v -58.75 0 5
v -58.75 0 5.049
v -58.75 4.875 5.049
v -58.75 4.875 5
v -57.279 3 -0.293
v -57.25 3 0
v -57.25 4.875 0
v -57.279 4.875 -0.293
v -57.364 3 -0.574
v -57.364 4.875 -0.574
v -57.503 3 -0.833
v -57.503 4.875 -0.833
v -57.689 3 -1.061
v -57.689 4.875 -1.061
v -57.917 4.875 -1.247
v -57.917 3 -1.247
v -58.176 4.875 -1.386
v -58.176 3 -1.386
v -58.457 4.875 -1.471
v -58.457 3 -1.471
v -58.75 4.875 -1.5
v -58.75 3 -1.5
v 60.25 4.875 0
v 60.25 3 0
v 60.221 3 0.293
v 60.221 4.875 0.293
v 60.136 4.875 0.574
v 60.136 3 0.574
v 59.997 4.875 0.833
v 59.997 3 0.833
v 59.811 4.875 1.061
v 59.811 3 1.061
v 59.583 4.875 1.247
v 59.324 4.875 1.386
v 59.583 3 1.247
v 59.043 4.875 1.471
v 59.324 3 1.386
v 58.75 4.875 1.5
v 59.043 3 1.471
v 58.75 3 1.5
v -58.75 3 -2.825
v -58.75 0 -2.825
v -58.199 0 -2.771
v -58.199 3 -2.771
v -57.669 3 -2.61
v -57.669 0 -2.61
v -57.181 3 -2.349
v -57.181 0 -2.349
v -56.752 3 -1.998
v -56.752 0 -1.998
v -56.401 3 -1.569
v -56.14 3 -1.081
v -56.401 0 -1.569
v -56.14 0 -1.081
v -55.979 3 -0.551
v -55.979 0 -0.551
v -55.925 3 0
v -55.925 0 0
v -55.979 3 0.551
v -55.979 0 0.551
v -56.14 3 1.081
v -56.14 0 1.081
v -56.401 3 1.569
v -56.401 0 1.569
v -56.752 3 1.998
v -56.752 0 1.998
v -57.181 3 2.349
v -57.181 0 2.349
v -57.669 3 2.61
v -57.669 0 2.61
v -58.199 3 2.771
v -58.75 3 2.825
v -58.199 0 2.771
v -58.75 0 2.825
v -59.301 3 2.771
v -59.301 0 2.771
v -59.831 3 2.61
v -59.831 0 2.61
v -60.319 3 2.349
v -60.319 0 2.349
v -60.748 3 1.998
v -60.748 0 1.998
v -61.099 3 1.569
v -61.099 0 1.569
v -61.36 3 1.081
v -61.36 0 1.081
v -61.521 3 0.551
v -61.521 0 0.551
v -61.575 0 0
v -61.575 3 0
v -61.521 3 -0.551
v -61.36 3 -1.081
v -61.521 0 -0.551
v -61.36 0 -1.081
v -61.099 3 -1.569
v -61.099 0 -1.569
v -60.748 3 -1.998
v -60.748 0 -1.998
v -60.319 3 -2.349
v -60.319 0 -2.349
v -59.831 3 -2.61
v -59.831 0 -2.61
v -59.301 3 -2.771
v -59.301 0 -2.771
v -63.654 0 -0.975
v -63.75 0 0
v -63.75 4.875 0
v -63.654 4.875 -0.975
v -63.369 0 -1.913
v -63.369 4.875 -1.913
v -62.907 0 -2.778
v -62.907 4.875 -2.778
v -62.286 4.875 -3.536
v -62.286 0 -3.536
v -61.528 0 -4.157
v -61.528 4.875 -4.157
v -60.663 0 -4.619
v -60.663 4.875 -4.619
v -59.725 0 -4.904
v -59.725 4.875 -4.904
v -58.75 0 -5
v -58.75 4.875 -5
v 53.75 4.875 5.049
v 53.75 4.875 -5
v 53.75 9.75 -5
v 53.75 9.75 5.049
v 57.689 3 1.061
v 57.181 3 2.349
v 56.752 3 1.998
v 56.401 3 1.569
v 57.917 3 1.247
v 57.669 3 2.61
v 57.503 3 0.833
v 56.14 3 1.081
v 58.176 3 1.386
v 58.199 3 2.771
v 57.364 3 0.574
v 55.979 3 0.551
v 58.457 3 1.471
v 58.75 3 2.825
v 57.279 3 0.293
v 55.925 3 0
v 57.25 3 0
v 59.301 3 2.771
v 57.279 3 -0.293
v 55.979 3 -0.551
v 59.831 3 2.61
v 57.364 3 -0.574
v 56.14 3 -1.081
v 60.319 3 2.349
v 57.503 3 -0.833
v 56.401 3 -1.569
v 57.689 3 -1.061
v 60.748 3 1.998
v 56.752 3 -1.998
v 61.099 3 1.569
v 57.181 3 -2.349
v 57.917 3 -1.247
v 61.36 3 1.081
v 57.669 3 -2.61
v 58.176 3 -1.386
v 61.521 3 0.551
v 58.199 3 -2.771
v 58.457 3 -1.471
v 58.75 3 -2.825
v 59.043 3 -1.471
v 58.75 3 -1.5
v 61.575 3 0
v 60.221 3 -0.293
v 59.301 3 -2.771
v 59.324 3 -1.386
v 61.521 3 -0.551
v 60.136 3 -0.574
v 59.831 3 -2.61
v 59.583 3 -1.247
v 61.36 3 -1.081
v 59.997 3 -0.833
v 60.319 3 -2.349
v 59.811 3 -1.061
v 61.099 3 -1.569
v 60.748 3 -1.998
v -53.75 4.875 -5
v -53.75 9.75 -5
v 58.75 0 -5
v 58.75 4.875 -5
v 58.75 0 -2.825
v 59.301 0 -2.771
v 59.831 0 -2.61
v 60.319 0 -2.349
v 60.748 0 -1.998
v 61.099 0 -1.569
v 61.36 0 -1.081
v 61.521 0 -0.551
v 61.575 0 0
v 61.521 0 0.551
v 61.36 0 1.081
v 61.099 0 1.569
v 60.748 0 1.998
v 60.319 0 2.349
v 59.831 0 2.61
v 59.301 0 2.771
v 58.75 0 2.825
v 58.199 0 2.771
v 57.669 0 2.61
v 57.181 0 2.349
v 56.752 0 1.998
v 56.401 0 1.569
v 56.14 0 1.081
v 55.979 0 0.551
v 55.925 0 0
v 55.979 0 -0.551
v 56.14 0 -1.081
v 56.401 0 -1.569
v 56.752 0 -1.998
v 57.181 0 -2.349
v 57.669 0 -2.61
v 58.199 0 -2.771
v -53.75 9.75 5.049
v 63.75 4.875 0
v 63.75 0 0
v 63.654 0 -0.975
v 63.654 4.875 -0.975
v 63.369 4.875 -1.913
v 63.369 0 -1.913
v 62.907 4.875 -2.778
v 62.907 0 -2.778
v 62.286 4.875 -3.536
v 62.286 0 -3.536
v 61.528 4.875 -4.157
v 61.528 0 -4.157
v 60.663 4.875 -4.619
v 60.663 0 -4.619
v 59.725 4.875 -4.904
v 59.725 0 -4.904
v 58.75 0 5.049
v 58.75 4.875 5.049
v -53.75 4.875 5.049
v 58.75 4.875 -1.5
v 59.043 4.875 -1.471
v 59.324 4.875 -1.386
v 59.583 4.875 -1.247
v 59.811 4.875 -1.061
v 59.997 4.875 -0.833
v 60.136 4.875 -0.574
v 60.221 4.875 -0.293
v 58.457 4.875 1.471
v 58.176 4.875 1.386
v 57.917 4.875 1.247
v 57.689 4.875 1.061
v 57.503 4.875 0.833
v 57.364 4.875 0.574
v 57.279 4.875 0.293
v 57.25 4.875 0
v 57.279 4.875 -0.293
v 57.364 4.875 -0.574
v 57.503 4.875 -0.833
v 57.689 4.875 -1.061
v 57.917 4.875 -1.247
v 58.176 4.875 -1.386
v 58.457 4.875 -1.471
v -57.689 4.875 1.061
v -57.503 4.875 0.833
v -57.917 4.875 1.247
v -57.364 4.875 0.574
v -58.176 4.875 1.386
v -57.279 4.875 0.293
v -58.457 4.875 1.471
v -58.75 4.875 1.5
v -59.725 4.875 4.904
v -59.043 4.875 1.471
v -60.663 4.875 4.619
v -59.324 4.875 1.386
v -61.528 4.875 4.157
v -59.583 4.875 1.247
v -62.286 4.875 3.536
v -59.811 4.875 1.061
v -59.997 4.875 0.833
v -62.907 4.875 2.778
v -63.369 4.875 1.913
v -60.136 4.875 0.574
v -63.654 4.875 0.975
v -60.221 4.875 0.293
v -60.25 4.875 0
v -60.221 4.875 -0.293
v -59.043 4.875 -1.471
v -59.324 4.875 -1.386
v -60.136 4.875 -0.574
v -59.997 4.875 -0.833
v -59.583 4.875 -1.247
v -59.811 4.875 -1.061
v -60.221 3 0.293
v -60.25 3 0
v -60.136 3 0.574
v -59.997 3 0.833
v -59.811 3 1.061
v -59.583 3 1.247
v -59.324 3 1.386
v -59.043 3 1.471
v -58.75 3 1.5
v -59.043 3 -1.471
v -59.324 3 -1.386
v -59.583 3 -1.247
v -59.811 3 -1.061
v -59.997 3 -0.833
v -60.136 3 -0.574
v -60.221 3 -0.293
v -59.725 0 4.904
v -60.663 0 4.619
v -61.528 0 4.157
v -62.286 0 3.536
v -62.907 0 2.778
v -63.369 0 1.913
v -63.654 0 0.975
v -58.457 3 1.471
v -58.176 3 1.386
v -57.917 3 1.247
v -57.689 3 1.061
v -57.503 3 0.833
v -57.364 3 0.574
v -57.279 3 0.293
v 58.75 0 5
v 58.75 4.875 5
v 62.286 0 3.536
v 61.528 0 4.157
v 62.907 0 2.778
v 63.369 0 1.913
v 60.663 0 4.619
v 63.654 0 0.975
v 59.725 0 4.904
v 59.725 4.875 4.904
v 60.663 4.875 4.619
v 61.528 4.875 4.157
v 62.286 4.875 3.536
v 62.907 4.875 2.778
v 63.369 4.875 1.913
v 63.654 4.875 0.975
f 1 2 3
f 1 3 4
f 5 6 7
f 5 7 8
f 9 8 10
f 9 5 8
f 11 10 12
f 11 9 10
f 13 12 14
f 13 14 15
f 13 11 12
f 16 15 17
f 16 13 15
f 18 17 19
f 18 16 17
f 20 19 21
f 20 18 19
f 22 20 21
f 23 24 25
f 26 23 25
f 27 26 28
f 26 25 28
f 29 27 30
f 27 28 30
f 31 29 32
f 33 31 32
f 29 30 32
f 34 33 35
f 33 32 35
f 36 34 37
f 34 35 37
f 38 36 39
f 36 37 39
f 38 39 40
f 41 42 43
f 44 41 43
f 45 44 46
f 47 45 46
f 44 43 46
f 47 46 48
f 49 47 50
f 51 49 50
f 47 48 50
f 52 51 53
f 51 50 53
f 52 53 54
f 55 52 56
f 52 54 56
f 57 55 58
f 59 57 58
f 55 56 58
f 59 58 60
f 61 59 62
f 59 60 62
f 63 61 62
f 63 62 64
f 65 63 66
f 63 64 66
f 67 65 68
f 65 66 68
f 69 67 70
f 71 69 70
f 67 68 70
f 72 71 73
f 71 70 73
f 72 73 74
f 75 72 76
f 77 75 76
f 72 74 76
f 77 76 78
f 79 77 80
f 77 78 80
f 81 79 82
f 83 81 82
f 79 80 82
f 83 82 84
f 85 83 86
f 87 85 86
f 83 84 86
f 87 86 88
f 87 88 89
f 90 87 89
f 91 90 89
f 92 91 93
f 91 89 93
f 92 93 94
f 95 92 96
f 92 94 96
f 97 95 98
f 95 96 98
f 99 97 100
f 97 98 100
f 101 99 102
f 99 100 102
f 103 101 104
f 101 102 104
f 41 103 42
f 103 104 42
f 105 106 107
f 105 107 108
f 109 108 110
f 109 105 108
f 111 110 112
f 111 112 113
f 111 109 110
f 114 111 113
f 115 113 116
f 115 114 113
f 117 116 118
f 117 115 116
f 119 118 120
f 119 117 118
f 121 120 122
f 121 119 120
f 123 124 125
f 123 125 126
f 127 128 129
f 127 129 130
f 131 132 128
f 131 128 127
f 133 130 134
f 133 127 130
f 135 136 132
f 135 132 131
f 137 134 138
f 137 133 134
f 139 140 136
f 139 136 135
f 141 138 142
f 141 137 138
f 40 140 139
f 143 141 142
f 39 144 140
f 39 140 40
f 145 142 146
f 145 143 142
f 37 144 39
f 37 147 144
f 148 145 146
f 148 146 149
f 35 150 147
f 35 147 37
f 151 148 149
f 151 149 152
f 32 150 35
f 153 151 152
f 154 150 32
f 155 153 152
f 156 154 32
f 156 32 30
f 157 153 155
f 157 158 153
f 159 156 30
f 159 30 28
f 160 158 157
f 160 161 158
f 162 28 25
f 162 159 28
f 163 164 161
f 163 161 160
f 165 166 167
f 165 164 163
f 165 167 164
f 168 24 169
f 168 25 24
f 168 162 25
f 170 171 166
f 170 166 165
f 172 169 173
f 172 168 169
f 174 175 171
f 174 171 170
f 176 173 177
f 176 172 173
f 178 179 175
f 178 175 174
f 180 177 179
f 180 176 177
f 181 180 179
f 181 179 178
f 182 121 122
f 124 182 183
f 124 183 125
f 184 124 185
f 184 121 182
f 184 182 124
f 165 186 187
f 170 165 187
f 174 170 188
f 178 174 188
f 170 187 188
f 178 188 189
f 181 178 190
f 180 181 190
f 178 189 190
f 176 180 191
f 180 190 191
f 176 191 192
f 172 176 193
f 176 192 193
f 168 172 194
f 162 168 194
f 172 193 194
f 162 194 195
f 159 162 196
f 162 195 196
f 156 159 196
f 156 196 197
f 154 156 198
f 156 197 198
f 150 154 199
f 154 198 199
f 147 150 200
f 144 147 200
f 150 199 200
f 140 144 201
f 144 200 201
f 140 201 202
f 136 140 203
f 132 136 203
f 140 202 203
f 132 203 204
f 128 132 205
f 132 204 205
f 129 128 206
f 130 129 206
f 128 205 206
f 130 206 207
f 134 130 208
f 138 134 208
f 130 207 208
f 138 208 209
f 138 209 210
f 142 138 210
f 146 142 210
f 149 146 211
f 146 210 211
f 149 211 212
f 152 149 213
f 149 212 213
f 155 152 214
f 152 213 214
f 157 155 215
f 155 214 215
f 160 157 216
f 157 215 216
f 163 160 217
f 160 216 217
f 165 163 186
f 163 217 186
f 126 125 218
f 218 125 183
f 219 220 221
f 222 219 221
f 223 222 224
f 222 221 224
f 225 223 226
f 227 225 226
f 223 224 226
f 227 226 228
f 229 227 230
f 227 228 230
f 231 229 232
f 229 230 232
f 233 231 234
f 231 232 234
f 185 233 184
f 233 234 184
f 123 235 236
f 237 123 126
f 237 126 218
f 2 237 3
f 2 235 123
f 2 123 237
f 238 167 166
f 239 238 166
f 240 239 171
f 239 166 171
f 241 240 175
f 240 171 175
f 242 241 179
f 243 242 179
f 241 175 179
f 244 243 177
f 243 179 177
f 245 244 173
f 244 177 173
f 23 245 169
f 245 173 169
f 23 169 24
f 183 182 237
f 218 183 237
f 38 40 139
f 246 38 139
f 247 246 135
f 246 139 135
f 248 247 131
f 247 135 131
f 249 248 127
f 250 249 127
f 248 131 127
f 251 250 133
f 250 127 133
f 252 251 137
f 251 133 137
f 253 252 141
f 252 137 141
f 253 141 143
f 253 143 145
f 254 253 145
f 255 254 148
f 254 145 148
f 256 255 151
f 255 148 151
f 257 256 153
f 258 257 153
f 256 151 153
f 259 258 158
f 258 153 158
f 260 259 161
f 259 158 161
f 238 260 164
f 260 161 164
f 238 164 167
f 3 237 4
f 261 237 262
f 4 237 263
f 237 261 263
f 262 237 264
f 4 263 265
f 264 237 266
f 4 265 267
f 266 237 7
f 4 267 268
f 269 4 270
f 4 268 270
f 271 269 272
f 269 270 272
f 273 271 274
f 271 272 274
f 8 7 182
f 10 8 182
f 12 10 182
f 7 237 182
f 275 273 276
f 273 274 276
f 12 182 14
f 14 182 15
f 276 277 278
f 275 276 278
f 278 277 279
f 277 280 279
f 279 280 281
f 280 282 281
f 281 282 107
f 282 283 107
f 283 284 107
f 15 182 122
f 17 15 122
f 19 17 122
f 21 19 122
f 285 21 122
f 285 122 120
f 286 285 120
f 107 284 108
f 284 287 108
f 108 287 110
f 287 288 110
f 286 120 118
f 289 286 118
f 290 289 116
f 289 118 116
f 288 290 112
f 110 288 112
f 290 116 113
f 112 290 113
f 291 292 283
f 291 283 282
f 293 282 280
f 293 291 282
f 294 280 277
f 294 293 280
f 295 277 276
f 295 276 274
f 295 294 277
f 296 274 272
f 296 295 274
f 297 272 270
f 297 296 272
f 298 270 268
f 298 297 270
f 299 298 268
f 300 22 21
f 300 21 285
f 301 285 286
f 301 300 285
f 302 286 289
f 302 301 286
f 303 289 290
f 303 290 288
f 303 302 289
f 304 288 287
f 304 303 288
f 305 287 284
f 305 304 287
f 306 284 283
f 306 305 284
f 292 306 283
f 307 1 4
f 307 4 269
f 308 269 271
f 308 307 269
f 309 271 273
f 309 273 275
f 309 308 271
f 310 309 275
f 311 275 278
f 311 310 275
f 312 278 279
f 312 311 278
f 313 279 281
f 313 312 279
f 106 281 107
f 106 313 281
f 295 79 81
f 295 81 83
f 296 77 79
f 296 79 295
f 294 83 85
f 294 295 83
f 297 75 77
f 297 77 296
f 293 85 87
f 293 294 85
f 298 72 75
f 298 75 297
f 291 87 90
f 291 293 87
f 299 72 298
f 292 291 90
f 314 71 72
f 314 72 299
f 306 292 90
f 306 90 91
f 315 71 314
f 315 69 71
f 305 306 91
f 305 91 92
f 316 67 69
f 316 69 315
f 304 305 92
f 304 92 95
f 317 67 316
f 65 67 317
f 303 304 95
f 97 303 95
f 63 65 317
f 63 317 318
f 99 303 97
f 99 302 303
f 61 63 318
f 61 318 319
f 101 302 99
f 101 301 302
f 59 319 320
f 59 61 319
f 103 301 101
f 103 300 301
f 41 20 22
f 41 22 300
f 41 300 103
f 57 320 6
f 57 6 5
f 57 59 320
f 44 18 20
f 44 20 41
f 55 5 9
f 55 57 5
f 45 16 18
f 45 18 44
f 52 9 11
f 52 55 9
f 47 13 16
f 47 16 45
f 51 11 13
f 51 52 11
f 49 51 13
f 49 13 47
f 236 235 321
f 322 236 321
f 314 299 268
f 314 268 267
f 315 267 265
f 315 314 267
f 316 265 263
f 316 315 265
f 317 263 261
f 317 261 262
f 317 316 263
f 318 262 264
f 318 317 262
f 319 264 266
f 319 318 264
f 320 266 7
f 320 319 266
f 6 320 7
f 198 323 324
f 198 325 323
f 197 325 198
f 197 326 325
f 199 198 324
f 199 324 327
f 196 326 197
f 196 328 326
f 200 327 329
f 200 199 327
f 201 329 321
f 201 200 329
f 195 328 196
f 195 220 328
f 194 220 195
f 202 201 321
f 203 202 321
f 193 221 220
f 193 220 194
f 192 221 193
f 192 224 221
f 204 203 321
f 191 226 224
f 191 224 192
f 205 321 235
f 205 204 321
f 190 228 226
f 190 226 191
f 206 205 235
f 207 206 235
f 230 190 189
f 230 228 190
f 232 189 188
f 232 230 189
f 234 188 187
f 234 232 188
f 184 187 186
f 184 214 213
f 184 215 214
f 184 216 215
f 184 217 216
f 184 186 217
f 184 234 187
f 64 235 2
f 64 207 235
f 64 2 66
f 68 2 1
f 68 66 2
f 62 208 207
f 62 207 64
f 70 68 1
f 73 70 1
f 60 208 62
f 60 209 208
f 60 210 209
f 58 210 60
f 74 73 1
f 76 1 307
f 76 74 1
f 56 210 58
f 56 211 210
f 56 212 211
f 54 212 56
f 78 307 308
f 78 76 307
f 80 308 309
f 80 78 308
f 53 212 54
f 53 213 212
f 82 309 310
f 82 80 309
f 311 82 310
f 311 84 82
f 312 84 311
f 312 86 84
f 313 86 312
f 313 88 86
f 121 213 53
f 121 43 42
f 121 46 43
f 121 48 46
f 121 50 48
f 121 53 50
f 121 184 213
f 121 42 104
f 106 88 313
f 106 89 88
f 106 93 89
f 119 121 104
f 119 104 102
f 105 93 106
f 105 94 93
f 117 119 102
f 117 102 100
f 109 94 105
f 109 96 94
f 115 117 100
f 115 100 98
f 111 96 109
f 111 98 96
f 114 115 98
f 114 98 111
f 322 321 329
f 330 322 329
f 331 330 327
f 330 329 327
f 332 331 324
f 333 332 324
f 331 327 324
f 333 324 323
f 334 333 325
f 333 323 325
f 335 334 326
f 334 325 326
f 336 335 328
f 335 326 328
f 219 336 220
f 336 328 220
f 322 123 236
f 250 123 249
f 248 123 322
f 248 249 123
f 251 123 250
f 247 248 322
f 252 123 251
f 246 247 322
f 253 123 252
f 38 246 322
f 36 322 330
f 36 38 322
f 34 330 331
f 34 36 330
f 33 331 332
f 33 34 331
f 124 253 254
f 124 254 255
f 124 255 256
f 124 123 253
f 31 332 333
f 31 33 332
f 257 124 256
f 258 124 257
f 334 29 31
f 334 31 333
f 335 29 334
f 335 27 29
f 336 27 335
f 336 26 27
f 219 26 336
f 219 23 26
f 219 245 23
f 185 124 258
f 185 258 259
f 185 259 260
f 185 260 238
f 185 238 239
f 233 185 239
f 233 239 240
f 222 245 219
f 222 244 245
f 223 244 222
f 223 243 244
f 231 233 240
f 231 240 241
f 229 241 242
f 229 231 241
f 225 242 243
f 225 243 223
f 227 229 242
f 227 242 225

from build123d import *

# Parameters (mm, degrees)
BOSS_EXTRUDE1_DEPTH = 9.75
CUT_EXTRUDE3_START  = -4.875
CUT_EXTRUDE3_DEPTH  = 4.875
SKETCH3_R           = 2.825
CUT_EXTRUDE4_DEPTH  = 3


with BuildPart() as part:
    # Sketch1 → Boss-Extrude1 (new body)
    with BuildSketch(Plane(origin=(0, 0, 0), x_dir=(1, 0, 0), z_dir=(0, 1, 0))):
        with BuildLine():
            Line((0, 5), (0, 0))
            Line((0, 0), (53.75, 0))
            ThreePointArc((53.75, 0), (55.214466094, 3.535533906), (58.75, 5))
            Line((58.75, 5), (0, 5))
        make_face()
        with BuildLine():
            Line((53.75, 0), (0, 0))
            Line((0, 0), (0, -5.049027621))
            Line((0, -5.049027621), (58.75, -5.049027621))
            Line((58.75, -5.049027621), (58.75, -5))
            ThreePointArc((58.75, -5), (55.214466094, -3.535533906), (53.75, 0))
        make_face()
        with BuildLine():
            ThreePointArc((63.75, 0), (62.285533906, 3.535533906), (58.75, 5))
            Line((58.75, 5), (58.75, 1.5))
            ThreePointArc((58.75, 1.5), (59.810660172, 1.060660172), (60.25, 0))
            ThreePointArc((60.25, 0), (59.810660172, -1.060660172), (58.75, -1.5))
            Line((58.75, -1.5), (58.75, -5))
            ThreePointArc((58.75, -5), (62.285533906, -3.535533906), (63.75, 0))
        make_face()
        with BuildLine():
            ThreePointArc((58.75, 5), (55.214466094, 3.535533906), (53.75, 0))
            Line((53.75, 0), (57.25, 0))
            ThreePointArc((57.25, 0), (57.689339828, 1.060660172), (58.75, 1.5))
            Line((58.75, 1.5), (58.75, 5))
        make_face()
        with BuildLine():
            Line((57.25, 0), (53.75, 0))
            ThreePointArc((53.75, 0), (55.214466094, -3.535533906), (58.75, -5))
            Line((58.75, -5), (58.75, -1.5))
            ThreePointArc((58.75, -1.5), (57.689339828, -1.060660172), (57.25, 0))
        make_face()
    boss_extrude1 = extrude(amount=BOSS_EXTRUDE1_DEPTH)

    # Mirror1: Boss-Extrude1 across plane
    add(boss_extrude1.mirror(Plane(origin=(0, 0, 0), x_dir=(0, 0, 1), z_dir=(1, 0, 0))))

    # Sketch2 → Cut-Extrude3 (cut)
    with BuildSketch(Plane(origin=(0, 9.75, 0), x_dir=(1, 0, 0), z_dir=(0, 1, 0)).offset(CUT_EXTRUDE3_START)):
        with BuildLine():
            Line((60.25, 0), (63.75, 0))
            ThreePointArc((63.75, 0), (62.285533906, 3.535533906), (58.75, 5))
            Line((58.75, 5), (53.75, 5))
            Line((53.75, 5), (53.75, 0))
            Line((53.75, 0), (57.25, 0))
            ThreePointArc((57.25, 0), (58.75, 1.5), (60.25, 0))
        make_face()
        with BuildLine():
            ThreePointArc((58.75, -5), (62.285533906, -3.535533906), (63.75, 0))
            Line((63.75, 0), (60.25, 0))
            ThreePointArc((60.25, 0), (58.75, -1.5), (57.25, 0))
            Line((57.25, 0), (53.75, 0))
            Line((53.75, 0), (53.75, -5.049027621))
            Line((53.75, -5.049027621), (58.75, -5.049027621))
            Line((58.75, -5.049027621), (58.75, -5))
        make_face()
    cut_extrude3 = extrude(amount=CUT_EXTRUDE3_DEPTH, mode=Mode.SUBTRACT)

    # Mirror2: Cut-Extrude3 across plane
    add(cut_extrude3.mirror(Plane(origin=(0, 0, 0), x_dir=(0, 0, 1), z_dir=(1, 0, 0))), mode=Mode.SUBTRACT)

    # Sketch3 → Cut-Extrude4 (cut)
    with BuildSketch(Plane(origin=(0, 0, 0), x_dir=(-1, 0, 0), z_dir=(0, -1, 0))):
        with Locations(Location((58.75, 0, 0), (0, 0, 90))):
            Circle(SKETCH3_R)
        with Locations(Location((-58.75, 0, 0), (0, 0, 90))):
            Circle(SKETCH3_R)
    extrude(amount=-CUT_EXTRUDE4_DEPTH, mode=Mode.SUBTRACT)


solid = part.part
